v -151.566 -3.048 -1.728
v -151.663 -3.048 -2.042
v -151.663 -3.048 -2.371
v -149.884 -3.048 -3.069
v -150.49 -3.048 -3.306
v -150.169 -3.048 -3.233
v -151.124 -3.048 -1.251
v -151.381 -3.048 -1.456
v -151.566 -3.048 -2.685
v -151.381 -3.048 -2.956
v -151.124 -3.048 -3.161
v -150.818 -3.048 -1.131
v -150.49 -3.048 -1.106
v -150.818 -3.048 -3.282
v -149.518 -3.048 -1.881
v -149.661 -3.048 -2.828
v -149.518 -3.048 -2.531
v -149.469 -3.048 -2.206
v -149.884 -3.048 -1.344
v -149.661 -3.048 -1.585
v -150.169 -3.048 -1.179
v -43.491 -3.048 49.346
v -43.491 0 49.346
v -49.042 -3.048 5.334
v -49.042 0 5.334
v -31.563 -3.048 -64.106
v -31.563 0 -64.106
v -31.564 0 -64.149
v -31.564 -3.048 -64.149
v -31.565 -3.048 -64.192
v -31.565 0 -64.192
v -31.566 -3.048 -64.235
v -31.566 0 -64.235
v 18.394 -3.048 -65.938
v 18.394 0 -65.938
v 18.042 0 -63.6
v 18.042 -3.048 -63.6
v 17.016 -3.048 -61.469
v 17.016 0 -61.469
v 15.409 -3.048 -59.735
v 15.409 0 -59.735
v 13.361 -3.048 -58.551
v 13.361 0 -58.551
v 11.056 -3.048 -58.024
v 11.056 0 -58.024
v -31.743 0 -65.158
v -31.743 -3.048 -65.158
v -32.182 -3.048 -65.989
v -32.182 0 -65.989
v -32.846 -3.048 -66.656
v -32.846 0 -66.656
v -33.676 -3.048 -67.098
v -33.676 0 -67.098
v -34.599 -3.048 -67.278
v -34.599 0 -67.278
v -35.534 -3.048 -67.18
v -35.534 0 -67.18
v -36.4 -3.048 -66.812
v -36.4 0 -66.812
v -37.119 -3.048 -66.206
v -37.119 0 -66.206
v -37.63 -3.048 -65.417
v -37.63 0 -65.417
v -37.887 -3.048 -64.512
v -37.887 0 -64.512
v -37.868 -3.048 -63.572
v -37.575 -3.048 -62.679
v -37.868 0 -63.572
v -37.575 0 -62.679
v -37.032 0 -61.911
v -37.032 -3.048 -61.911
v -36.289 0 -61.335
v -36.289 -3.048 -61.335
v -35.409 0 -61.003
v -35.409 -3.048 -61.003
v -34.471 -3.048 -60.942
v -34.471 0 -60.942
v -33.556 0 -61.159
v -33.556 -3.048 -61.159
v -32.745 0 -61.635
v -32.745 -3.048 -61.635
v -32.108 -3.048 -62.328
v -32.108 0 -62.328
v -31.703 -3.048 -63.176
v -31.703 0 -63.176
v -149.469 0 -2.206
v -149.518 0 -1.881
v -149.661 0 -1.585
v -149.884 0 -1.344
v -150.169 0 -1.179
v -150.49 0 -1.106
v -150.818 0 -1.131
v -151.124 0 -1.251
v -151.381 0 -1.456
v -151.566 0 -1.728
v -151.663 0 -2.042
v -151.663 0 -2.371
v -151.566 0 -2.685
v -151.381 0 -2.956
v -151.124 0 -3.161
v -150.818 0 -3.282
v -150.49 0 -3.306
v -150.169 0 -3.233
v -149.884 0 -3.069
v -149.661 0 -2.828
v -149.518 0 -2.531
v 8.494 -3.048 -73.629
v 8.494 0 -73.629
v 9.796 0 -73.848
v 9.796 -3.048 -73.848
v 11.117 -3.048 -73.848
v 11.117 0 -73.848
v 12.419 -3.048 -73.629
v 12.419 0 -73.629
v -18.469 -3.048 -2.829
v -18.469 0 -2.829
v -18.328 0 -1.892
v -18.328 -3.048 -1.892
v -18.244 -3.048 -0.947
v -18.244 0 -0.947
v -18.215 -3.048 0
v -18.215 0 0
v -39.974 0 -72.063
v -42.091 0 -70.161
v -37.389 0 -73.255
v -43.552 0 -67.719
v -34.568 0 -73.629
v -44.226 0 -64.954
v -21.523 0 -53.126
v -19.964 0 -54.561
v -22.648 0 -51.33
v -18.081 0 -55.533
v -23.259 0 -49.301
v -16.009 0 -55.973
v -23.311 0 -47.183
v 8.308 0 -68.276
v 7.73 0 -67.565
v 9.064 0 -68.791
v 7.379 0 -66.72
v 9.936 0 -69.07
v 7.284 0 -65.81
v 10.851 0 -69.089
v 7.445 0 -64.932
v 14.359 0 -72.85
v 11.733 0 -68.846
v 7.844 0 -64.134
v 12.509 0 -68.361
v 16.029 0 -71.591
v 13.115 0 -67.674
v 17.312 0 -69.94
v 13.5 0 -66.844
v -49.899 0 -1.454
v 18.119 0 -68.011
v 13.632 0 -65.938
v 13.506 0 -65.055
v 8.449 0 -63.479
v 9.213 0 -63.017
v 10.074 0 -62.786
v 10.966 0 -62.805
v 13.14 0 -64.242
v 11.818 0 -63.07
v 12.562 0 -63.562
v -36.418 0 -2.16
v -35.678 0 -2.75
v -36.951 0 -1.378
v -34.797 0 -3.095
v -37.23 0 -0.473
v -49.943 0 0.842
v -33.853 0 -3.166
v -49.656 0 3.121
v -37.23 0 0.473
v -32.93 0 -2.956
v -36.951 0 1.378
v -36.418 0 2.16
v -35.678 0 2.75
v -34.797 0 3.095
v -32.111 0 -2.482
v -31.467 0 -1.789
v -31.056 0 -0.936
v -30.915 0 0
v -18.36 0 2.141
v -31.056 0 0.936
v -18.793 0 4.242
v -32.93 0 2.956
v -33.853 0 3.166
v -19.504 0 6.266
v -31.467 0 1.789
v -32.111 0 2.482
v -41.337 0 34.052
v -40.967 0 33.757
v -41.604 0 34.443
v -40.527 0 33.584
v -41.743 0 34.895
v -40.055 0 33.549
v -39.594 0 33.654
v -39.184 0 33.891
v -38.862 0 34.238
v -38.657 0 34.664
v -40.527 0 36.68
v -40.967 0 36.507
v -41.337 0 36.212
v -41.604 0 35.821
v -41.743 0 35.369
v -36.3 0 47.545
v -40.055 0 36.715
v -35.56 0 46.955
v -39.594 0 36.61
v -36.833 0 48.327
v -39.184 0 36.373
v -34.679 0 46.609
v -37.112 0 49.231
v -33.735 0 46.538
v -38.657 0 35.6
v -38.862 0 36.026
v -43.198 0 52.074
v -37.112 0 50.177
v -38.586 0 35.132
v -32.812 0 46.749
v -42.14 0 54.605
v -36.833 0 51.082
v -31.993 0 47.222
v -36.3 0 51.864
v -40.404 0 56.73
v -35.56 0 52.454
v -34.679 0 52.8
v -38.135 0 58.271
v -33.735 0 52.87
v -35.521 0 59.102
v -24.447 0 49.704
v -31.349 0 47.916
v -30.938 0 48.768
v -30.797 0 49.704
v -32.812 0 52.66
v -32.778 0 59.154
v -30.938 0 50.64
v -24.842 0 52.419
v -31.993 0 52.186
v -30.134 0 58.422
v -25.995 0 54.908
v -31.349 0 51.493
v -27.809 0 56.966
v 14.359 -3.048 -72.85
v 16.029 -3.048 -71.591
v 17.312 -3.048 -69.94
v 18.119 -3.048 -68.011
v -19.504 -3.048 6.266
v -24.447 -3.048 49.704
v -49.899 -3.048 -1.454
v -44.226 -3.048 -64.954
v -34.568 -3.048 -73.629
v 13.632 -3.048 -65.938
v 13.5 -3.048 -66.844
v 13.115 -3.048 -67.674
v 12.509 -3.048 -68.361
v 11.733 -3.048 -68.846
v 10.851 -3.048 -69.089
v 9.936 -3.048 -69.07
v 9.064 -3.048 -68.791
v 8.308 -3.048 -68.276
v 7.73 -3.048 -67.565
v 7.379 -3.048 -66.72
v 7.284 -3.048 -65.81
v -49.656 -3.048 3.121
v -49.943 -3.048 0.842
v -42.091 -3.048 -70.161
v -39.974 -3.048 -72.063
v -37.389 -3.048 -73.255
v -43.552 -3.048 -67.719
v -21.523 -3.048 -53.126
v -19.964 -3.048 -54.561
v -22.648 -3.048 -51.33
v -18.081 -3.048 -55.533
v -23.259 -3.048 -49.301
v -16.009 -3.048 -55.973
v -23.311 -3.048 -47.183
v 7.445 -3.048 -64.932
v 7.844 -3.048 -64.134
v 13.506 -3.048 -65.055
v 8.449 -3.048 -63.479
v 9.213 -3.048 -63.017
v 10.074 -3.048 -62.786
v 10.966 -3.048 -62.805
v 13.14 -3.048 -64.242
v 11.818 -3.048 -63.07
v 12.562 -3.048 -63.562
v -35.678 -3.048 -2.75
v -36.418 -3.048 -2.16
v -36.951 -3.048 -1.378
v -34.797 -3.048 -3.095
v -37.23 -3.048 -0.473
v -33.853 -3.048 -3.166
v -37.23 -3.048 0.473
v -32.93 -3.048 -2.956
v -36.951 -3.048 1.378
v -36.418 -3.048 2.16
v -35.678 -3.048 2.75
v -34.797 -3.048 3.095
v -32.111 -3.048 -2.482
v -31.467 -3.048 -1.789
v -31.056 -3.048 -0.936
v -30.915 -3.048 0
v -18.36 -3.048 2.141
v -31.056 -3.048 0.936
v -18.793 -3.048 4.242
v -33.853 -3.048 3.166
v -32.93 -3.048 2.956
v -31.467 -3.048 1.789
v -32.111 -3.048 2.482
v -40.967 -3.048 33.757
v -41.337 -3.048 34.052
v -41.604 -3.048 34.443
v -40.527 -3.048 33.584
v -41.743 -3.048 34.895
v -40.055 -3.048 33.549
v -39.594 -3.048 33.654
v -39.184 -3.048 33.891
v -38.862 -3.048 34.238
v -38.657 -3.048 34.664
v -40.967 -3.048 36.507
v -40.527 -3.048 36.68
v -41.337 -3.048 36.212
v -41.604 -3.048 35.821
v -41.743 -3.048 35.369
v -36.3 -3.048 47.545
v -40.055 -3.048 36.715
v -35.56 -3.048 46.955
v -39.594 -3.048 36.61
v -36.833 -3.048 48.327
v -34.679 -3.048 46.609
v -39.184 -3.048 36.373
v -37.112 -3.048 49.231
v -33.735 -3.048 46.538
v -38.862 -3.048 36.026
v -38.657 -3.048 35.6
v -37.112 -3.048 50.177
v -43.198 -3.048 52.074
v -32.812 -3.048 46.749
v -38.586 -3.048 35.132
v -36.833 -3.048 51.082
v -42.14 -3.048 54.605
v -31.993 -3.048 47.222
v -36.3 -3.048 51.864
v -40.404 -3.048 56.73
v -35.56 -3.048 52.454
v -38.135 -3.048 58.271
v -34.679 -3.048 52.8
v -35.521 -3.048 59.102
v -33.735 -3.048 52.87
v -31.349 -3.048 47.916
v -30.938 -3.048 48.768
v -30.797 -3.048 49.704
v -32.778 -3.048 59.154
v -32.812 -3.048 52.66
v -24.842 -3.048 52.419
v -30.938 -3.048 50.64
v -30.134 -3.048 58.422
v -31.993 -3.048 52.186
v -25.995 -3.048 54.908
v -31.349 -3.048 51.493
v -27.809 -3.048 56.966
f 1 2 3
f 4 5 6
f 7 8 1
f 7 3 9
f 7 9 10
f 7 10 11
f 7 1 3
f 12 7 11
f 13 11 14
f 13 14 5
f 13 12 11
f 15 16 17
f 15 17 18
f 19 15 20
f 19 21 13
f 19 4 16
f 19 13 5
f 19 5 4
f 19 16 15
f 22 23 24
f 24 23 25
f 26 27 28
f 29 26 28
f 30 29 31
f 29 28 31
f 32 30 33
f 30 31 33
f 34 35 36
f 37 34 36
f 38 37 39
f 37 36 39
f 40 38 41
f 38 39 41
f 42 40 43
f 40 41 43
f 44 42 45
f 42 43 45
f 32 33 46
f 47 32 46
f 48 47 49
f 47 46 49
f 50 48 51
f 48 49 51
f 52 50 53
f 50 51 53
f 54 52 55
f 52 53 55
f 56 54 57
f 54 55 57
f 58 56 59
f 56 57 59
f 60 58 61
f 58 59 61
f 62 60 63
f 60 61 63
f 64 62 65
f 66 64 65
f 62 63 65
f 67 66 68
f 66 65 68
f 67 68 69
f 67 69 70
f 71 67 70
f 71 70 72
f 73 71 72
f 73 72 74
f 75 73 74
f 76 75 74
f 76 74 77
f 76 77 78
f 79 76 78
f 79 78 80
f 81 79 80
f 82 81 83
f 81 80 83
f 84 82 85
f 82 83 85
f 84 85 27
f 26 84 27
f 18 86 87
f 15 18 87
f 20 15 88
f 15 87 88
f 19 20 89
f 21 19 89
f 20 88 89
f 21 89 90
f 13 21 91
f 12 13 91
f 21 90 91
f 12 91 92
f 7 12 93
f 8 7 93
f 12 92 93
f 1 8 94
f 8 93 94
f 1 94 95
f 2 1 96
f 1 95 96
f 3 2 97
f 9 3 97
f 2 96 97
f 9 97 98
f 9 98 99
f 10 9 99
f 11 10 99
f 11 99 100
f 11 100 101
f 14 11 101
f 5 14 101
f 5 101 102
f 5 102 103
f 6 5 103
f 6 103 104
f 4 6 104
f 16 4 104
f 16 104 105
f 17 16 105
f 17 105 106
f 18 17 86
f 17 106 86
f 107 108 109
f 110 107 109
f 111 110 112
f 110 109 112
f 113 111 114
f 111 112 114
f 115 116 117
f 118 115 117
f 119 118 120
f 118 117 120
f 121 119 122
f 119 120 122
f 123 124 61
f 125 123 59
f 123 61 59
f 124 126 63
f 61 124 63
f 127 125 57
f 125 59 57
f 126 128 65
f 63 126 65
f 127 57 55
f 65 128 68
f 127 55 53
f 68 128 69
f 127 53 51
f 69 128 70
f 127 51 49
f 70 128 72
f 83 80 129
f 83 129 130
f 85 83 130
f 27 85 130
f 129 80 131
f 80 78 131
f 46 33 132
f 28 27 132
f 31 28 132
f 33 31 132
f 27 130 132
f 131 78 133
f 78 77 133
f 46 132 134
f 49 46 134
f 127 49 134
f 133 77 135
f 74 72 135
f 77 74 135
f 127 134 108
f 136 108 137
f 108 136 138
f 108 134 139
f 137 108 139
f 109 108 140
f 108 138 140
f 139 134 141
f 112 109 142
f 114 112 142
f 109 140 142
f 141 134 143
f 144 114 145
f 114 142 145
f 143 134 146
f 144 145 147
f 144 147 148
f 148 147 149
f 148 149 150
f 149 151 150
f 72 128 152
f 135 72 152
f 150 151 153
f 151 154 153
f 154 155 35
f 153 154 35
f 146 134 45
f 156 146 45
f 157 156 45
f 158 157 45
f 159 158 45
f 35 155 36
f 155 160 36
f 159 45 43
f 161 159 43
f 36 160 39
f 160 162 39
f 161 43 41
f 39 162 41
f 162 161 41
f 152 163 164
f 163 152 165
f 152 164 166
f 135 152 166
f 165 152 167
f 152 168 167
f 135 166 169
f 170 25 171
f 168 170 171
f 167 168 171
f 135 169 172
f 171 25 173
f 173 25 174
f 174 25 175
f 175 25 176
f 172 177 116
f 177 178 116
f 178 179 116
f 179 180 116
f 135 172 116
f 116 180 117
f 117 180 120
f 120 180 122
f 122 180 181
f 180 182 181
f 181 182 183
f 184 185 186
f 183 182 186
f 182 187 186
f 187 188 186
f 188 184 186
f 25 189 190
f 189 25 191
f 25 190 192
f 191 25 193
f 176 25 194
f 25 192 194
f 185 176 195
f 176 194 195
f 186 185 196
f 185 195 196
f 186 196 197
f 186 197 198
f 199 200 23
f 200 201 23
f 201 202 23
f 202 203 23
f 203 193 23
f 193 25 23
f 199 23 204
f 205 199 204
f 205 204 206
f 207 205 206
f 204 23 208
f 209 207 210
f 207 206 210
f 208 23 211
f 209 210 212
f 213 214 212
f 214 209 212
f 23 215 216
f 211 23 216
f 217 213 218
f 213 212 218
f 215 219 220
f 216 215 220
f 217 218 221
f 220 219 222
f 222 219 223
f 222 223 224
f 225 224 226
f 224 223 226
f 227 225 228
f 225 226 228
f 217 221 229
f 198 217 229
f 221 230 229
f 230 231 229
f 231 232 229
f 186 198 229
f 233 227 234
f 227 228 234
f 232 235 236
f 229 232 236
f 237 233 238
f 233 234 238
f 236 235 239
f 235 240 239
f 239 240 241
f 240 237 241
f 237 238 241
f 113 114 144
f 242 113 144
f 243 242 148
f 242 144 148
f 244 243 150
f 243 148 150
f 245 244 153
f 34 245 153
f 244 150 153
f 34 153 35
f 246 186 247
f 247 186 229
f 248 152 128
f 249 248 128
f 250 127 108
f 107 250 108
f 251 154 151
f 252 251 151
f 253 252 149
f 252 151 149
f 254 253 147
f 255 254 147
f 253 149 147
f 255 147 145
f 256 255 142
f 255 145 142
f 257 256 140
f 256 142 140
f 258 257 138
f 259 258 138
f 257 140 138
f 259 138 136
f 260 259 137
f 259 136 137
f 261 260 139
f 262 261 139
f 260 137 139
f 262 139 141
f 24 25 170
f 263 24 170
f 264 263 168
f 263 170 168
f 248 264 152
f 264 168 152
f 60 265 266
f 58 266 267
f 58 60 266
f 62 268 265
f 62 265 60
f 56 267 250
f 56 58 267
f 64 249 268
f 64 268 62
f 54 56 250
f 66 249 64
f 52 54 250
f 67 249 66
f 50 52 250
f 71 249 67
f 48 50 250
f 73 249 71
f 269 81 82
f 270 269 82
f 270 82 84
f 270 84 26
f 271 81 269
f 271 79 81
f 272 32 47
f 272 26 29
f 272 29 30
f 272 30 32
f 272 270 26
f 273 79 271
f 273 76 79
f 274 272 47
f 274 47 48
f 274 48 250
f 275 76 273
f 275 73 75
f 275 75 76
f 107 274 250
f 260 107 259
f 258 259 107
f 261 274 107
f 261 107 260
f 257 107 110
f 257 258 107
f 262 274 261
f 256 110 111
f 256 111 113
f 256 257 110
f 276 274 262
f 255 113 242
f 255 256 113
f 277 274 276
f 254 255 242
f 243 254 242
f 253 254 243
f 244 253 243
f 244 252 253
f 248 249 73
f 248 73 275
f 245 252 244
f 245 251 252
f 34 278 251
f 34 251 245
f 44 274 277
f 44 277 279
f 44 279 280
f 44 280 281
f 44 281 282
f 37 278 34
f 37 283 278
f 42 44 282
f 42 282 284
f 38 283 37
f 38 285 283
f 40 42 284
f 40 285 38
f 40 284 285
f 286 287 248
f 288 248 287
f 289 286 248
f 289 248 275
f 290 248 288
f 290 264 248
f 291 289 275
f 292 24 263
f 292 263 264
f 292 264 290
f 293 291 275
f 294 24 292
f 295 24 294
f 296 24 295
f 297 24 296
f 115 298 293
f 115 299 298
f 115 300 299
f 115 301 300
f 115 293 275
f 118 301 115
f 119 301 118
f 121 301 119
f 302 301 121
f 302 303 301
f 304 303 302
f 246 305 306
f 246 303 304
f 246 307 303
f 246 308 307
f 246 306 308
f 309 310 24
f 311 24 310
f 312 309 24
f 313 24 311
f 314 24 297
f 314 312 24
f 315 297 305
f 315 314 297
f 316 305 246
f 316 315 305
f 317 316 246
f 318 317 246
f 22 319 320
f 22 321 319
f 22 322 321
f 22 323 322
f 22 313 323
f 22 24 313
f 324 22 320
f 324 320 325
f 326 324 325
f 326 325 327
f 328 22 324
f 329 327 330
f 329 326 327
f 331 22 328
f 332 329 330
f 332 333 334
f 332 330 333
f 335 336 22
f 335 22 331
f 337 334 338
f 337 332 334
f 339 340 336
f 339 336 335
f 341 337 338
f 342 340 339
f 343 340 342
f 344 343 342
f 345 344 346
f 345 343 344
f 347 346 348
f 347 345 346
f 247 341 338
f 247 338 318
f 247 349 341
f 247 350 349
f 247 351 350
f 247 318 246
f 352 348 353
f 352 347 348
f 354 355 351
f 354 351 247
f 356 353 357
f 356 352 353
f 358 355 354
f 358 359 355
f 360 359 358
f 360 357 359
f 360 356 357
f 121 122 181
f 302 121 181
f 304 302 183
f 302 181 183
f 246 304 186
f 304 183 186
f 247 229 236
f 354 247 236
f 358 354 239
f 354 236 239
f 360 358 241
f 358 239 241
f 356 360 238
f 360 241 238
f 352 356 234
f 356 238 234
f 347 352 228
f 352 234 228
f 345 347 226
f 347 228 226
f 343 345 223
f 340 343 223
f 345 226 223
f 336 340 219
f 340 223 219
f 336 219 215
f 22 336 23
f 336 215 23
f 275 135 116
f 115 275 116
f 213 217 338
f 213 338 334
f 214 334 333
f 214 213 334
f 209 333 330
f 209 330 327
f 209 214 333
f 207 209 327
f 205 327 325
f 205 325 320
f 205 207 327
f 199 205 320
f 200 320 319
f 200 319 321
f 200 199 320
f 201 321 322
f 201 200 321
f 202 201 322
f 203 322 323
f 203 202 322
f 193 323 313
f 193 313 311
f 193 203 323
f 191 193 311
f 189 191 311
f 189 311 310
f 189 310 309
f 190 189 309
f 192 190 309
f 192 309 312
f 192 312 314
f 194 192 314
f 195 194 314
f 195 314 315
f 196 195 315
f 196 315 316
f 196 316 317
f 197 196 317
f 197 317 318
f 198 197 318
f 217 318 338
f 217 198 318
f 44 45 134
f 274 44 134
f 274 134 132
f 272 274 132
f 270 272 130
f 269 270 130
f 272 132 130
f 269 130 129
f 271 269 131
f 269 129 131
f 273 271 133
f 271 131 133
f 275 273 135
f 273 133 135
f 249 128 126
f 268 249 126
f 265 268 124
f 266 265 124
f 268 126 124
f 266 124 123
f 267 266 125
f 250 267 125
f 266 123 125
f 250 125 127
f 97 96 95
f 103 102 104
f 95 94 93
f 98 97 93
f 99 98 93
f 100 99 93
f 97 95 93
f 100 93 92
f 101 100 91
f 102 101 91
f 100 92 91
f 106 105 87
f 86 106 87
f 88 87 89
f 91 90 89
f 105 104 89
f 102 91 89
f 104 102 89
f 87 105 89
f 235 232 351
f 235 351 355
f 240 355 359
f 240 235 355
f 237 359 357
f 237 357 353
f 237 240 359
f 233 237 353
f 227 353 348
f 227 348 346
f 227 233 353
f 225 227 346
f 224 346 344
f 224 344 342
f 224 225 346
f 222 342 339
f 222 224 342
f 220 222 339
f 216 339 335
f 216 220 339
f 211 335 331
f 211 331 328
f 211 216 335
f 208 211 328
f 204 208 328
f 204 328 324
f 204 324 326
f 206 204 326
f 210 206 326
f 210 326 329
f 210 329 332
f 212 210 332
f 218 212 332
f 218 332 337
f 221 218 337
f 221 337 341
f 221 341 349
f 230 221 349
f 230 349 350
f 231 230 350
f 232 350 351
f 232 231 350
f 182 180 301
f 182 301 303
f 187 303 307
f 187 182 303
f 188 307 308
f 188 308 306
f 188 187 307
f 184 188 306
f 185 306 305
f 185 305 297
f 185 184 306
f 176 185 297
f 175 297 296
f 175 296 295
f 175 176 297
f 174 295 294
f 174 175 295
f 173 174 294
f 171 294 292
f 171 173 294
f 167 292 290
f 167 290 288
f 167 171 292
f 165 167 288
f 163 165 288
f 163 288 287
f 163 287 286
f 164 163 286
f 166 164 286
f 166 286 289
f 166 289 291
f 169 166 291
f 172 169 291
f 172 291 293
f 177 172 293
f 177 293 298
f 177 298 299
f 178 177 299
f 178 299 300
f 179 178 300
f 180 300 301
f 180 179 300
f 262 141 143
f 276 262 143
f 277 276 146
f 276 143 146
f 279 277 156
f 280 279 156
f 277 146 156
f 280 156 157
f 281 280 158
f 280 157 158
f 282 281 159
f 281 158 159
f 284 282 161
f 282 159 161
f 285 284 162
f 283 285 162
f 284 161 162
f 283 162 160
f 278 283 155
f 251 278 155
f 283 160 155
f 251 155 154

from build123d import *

# Parameters (mm, degrees)
F0_R     = 3.175
F0_R_2   = 1.5875
F1_DEPTH = 3.048
F0_R_3   = 1.1030918325


with BuildPart() as f1:
    # F0 (on Front) → F1 (new body)
    with BuildSketch(Plane.XZ):
        with BuildLine():
            ThreePointArc((-34.3240571053, 40.1856634328), (-27.362676467, 42.8457567674), (-24.4473527431, 49.7041679919))
            ThreePointArc((-24.4473527431, 49.7041679919), (-34.1512333085, 59.2274881452), (-43.4906339491, 49.3464699566))
            ThreePointArc((-43.4906339491, 49.3464699566), (-40.7054239458, 42.9668556806), (-34.3240571053, 40.1856634328))
        make_face()
        with Locations((-33.9723527431, 49.7041679919)):
            Circle(F0_R, mode=Mode.SUBTRACT)
        with BuildLine():
            Line((-19.5043619142, 6.2662041398), (-24.4473527431, 49.7041679919))
            ThreePointArc((-24.4473527431, 49.7041679919), (-27.362676467, 42.8457567674), (-34.3240571053, 40.1856634328))
            Line((-34.3240571053, 40.1856634328), (-34.3240571053, 15.8732792506))
            ThreePointArc((-34.3240571053, 15.8732792506), (-25.4548975397, 13.3208491692), (-19.5043619142, 6.2662041398))
        make_face()
        with BuildLine():
            ThreePointArc((-34.3240571053, 40.1856634328), (-40.7054239458, 42.9668556806), (-43.4906339491, 49.3464699566))
            Line((-43.4906339491, 49.3464699566), (-49.0424855942, 5.3337144552))
            ThreePointArc((-49.0424855942, 5.3337144552), (-43.3328051775, 12.9070593012), (-34.3240571053, 15.8732792506))
            Line((-34.3240571053, 15.8732792506), (-34.3240571053, 40.1856634328))
        make_face()
        with Locations((-40.1735305786, 35.1319760084)):
            Circle(F0_R_2, mode=Mode.SUBTRACT)
        with BuildLine():
            Line((-18.4693988413, -2.8288336832), (-19.5043619142, 6.2662041398))
            ThreePointArc((-19.5043619142, 6.2662041398), (-25.4548975397, 13.3208491692), (-34.3240571053, 15.8732792506))
            ThreePointArc((-34.3240571053, 15.8732792506), (-43.3328051775, 12.9070593012), (-49.0424855942, 5.3337144552))
            Line((-49.0424855942, 5.3337144552), (-49.8986413632, -1.4535300434))
            ThreePointArc((-49.8986413632, -1.4535300434), (-44.7535172274, -11.7606101174), (-33.9932924134, -15.8747034534))
            ThreePointArc((-33.9932924134, -15.8747034534), (-23.876988735, -12.153328485), (-18.4693988413, -2.8288336832))
        make_face()
        with Locations((-34.0903247099, 0)):
            Circle(F0_R, mode=Mode.SUBTRACT)
        with BuildLine():
            ThreePointArc((-18.2153247099, 0), (-18.5409230432, 3.1987079906), (-19.5043619142, 6.2662041398))
            Line((-19.5043619142, 6.2662041398), (-18.4693988413, -2.8288336832))
            ThreePointArc((-18.4693988413, -2.8288336832), (-18.2789708279, -1.4201103541), (-18.2153247099, 0))
        make_face()
        with BuildLine():
            Line((-49.8986413632, -1.4535300434), (-49.0424855942, 5.3337144552))
            ThreePointArc((-49.0424855942, 5.3337144552), (-49.840512536, 1.9867582749), (-49.8986413632, -1.4535300434))
        make_face()
        with BuildLine():
            Line((-23.3113934871, -47.182565119), (-18.4693988413, -2.8288336832))
            ThreePointArc((-18.4693988413, -2.8288336832), (-23.876988735, -12.153328485), (-33.9932924134, -15.8747034534))
            Line((-33.9932924134, -15.8747034534), (-33.9932924134, -54.6101585084))
            ThreePointArc((-33.9932924134, -54.6101585084), (-27.7447856232, -57.6396006759), (-25.2134807962, -64.1059638599))
            ThreePointArc((-25.2134807962, -64.1059638599), (-25.215435702, -64.298933116), (-25.2212996169, -64.4918231622))
            Line((-25.2212996169, -64.4918231622), (2.5257232705, -65.616783031))
            ThreePointArc((2.5257232705, -65.616783031), (5.1792686503, -60.0093743182), (11.056403534, -58.0235190582))
            Line((11.056403534, -58.0235190582), (-16.0088030873, -55.9728213429))
            ThreePointArc((-16.0088030873, -55.9728213429), (-21.5233938378, -53.1256440362), (-23.3113934871, -47.182565119))
        make_face()
        with BuildLine():
            ThreePointArc((-33.9932924134, -15.8747034534), (-44.7535172274, -11.7606101174), (-49.8986413632, -1.4535300434))
            Line((-49.8986413632, -1.4535300434), (-44.2256962235, -64.9535300434))
            ThreePointArc((-44.2256962235, -64.9535300434), (-41.5098981433, -57.4071929197), (-33.9932924134, -54.6101585084))
            Line((-33.9932924134, -54.6101585084), (-33.9932924134, -15.8747034534))
        make_face()
        with BuildLine():
            ThreePointArc((-33.9932924134, -54.6101585084), (-41.5098981433, -57.4071929197), (-44.2256962235, -64.9535300434))
            ThreePointArc((-44.2256962235, -64.9535300434), (-41.1037425062, -71.1917996161), (-34.5676464341, -73.6294317483))
            ThreePointArc((-34.5676464341, -73.6294317483), (-28.0797734178, -70.9167818027), (-25.2212996169, -64.4918231622))
            ThreePointArc((-25.2212996169, -64.4918231622), (-25.215435702, -64.298933116), (-25.2134807962, -64.1059638599))
            ThreePointArc((-25.2134807962, -64.1059638599), (-27.7447856232, -57.6396006759), (-33.9932924134, -54.6101585084))
        make_face()
        with BuildLine():
            ThreePointArc((-31.5634807962, -64.1059638599), (-31.5641324314, -64.1702869453), (-31.5660870697, -64.2345836273))
            ThreePointArc((-31.5660870697, -64.2345836273), (-37.9128291609, -64.0416407746), (-31.5634807962, -64.1059638599))
        make_face(mode=Mode.SUBTRACT)
        with BuildLine():
            ThreePointArc((-25.2212996169, -64.4918231622), (-28.0797734178, -70.9167818027), (-34.5676464341, -73.6294317483))
            Line((-34.5676464341, -73.6294317483), (8.4943371253, -73.6294317483))
            ThreePointArc((8.4943371253, -73.6294317483), (4.0911556031, -70.6800256277), (2.5257232705, -65.616783031))
            Line((2.5257232705, -65.616783031), (-25.2212996169, -64.4918231622))
        make_face()
        with BuildLine():
            ThreePointArc((18.3942075866, -65.9383324496), (16.2775319626, -60.5418604693), (11.056403534, -58.0235190582))
            ThreePointArc((11.056403534, -58.0235190582), (5.1792686503, -60.0093743182), (2.5257232705, -65.616783031))
            ThreePointArc((2.5257232705, -65.616783031), (4.0911556031, -70.6800256277), (8.4943371253, -73.6294317483))
            Line((8.4943371253, -73.6294317483), (12.4190780479, -73.6294317483))
            ThreePointArc((12.4190780479, -73.6294317483), (16.72489001, -70.8080136873), (18.3942075866, -65.9383324496))
        make_face()
        with BuildLine():
            ThreePointArc((13.6317075866, -65.9383324496), (10.3923845012, -69.1126808143), (7.2843138602, -65.8097126822))
            ThreePointArc((7.2843138602, -65.8097126822), (10.5210306719, -62.7639840848), (13.6317075866, -65.9383324496))
        make_face(mode=Mode.SUBTRACT)
        with BuildLine():
            Line((12.4190780479, -73.6294317483), (8.4943371253, -73.6294317483))
            ThreePointArc((8.4943371253, -73.6294317483), (10.4567075866, -73.8758324496), (12.4190780479, -73.6294317483))
        make_face()
    extrude(amount=F1_DEPTH)


with BuildPart() as f1b:
    # F0 (on Front) → F1, piece 2 (new body)
    with BuildSketch(Plane.XZ):
        with Locations((-150.5721614524, -2.2061855226)):
            Circle(F0_R_3)
    extrude(amount=F1_DEPTH)


solid = Compound([f1.part, f1b.part])
